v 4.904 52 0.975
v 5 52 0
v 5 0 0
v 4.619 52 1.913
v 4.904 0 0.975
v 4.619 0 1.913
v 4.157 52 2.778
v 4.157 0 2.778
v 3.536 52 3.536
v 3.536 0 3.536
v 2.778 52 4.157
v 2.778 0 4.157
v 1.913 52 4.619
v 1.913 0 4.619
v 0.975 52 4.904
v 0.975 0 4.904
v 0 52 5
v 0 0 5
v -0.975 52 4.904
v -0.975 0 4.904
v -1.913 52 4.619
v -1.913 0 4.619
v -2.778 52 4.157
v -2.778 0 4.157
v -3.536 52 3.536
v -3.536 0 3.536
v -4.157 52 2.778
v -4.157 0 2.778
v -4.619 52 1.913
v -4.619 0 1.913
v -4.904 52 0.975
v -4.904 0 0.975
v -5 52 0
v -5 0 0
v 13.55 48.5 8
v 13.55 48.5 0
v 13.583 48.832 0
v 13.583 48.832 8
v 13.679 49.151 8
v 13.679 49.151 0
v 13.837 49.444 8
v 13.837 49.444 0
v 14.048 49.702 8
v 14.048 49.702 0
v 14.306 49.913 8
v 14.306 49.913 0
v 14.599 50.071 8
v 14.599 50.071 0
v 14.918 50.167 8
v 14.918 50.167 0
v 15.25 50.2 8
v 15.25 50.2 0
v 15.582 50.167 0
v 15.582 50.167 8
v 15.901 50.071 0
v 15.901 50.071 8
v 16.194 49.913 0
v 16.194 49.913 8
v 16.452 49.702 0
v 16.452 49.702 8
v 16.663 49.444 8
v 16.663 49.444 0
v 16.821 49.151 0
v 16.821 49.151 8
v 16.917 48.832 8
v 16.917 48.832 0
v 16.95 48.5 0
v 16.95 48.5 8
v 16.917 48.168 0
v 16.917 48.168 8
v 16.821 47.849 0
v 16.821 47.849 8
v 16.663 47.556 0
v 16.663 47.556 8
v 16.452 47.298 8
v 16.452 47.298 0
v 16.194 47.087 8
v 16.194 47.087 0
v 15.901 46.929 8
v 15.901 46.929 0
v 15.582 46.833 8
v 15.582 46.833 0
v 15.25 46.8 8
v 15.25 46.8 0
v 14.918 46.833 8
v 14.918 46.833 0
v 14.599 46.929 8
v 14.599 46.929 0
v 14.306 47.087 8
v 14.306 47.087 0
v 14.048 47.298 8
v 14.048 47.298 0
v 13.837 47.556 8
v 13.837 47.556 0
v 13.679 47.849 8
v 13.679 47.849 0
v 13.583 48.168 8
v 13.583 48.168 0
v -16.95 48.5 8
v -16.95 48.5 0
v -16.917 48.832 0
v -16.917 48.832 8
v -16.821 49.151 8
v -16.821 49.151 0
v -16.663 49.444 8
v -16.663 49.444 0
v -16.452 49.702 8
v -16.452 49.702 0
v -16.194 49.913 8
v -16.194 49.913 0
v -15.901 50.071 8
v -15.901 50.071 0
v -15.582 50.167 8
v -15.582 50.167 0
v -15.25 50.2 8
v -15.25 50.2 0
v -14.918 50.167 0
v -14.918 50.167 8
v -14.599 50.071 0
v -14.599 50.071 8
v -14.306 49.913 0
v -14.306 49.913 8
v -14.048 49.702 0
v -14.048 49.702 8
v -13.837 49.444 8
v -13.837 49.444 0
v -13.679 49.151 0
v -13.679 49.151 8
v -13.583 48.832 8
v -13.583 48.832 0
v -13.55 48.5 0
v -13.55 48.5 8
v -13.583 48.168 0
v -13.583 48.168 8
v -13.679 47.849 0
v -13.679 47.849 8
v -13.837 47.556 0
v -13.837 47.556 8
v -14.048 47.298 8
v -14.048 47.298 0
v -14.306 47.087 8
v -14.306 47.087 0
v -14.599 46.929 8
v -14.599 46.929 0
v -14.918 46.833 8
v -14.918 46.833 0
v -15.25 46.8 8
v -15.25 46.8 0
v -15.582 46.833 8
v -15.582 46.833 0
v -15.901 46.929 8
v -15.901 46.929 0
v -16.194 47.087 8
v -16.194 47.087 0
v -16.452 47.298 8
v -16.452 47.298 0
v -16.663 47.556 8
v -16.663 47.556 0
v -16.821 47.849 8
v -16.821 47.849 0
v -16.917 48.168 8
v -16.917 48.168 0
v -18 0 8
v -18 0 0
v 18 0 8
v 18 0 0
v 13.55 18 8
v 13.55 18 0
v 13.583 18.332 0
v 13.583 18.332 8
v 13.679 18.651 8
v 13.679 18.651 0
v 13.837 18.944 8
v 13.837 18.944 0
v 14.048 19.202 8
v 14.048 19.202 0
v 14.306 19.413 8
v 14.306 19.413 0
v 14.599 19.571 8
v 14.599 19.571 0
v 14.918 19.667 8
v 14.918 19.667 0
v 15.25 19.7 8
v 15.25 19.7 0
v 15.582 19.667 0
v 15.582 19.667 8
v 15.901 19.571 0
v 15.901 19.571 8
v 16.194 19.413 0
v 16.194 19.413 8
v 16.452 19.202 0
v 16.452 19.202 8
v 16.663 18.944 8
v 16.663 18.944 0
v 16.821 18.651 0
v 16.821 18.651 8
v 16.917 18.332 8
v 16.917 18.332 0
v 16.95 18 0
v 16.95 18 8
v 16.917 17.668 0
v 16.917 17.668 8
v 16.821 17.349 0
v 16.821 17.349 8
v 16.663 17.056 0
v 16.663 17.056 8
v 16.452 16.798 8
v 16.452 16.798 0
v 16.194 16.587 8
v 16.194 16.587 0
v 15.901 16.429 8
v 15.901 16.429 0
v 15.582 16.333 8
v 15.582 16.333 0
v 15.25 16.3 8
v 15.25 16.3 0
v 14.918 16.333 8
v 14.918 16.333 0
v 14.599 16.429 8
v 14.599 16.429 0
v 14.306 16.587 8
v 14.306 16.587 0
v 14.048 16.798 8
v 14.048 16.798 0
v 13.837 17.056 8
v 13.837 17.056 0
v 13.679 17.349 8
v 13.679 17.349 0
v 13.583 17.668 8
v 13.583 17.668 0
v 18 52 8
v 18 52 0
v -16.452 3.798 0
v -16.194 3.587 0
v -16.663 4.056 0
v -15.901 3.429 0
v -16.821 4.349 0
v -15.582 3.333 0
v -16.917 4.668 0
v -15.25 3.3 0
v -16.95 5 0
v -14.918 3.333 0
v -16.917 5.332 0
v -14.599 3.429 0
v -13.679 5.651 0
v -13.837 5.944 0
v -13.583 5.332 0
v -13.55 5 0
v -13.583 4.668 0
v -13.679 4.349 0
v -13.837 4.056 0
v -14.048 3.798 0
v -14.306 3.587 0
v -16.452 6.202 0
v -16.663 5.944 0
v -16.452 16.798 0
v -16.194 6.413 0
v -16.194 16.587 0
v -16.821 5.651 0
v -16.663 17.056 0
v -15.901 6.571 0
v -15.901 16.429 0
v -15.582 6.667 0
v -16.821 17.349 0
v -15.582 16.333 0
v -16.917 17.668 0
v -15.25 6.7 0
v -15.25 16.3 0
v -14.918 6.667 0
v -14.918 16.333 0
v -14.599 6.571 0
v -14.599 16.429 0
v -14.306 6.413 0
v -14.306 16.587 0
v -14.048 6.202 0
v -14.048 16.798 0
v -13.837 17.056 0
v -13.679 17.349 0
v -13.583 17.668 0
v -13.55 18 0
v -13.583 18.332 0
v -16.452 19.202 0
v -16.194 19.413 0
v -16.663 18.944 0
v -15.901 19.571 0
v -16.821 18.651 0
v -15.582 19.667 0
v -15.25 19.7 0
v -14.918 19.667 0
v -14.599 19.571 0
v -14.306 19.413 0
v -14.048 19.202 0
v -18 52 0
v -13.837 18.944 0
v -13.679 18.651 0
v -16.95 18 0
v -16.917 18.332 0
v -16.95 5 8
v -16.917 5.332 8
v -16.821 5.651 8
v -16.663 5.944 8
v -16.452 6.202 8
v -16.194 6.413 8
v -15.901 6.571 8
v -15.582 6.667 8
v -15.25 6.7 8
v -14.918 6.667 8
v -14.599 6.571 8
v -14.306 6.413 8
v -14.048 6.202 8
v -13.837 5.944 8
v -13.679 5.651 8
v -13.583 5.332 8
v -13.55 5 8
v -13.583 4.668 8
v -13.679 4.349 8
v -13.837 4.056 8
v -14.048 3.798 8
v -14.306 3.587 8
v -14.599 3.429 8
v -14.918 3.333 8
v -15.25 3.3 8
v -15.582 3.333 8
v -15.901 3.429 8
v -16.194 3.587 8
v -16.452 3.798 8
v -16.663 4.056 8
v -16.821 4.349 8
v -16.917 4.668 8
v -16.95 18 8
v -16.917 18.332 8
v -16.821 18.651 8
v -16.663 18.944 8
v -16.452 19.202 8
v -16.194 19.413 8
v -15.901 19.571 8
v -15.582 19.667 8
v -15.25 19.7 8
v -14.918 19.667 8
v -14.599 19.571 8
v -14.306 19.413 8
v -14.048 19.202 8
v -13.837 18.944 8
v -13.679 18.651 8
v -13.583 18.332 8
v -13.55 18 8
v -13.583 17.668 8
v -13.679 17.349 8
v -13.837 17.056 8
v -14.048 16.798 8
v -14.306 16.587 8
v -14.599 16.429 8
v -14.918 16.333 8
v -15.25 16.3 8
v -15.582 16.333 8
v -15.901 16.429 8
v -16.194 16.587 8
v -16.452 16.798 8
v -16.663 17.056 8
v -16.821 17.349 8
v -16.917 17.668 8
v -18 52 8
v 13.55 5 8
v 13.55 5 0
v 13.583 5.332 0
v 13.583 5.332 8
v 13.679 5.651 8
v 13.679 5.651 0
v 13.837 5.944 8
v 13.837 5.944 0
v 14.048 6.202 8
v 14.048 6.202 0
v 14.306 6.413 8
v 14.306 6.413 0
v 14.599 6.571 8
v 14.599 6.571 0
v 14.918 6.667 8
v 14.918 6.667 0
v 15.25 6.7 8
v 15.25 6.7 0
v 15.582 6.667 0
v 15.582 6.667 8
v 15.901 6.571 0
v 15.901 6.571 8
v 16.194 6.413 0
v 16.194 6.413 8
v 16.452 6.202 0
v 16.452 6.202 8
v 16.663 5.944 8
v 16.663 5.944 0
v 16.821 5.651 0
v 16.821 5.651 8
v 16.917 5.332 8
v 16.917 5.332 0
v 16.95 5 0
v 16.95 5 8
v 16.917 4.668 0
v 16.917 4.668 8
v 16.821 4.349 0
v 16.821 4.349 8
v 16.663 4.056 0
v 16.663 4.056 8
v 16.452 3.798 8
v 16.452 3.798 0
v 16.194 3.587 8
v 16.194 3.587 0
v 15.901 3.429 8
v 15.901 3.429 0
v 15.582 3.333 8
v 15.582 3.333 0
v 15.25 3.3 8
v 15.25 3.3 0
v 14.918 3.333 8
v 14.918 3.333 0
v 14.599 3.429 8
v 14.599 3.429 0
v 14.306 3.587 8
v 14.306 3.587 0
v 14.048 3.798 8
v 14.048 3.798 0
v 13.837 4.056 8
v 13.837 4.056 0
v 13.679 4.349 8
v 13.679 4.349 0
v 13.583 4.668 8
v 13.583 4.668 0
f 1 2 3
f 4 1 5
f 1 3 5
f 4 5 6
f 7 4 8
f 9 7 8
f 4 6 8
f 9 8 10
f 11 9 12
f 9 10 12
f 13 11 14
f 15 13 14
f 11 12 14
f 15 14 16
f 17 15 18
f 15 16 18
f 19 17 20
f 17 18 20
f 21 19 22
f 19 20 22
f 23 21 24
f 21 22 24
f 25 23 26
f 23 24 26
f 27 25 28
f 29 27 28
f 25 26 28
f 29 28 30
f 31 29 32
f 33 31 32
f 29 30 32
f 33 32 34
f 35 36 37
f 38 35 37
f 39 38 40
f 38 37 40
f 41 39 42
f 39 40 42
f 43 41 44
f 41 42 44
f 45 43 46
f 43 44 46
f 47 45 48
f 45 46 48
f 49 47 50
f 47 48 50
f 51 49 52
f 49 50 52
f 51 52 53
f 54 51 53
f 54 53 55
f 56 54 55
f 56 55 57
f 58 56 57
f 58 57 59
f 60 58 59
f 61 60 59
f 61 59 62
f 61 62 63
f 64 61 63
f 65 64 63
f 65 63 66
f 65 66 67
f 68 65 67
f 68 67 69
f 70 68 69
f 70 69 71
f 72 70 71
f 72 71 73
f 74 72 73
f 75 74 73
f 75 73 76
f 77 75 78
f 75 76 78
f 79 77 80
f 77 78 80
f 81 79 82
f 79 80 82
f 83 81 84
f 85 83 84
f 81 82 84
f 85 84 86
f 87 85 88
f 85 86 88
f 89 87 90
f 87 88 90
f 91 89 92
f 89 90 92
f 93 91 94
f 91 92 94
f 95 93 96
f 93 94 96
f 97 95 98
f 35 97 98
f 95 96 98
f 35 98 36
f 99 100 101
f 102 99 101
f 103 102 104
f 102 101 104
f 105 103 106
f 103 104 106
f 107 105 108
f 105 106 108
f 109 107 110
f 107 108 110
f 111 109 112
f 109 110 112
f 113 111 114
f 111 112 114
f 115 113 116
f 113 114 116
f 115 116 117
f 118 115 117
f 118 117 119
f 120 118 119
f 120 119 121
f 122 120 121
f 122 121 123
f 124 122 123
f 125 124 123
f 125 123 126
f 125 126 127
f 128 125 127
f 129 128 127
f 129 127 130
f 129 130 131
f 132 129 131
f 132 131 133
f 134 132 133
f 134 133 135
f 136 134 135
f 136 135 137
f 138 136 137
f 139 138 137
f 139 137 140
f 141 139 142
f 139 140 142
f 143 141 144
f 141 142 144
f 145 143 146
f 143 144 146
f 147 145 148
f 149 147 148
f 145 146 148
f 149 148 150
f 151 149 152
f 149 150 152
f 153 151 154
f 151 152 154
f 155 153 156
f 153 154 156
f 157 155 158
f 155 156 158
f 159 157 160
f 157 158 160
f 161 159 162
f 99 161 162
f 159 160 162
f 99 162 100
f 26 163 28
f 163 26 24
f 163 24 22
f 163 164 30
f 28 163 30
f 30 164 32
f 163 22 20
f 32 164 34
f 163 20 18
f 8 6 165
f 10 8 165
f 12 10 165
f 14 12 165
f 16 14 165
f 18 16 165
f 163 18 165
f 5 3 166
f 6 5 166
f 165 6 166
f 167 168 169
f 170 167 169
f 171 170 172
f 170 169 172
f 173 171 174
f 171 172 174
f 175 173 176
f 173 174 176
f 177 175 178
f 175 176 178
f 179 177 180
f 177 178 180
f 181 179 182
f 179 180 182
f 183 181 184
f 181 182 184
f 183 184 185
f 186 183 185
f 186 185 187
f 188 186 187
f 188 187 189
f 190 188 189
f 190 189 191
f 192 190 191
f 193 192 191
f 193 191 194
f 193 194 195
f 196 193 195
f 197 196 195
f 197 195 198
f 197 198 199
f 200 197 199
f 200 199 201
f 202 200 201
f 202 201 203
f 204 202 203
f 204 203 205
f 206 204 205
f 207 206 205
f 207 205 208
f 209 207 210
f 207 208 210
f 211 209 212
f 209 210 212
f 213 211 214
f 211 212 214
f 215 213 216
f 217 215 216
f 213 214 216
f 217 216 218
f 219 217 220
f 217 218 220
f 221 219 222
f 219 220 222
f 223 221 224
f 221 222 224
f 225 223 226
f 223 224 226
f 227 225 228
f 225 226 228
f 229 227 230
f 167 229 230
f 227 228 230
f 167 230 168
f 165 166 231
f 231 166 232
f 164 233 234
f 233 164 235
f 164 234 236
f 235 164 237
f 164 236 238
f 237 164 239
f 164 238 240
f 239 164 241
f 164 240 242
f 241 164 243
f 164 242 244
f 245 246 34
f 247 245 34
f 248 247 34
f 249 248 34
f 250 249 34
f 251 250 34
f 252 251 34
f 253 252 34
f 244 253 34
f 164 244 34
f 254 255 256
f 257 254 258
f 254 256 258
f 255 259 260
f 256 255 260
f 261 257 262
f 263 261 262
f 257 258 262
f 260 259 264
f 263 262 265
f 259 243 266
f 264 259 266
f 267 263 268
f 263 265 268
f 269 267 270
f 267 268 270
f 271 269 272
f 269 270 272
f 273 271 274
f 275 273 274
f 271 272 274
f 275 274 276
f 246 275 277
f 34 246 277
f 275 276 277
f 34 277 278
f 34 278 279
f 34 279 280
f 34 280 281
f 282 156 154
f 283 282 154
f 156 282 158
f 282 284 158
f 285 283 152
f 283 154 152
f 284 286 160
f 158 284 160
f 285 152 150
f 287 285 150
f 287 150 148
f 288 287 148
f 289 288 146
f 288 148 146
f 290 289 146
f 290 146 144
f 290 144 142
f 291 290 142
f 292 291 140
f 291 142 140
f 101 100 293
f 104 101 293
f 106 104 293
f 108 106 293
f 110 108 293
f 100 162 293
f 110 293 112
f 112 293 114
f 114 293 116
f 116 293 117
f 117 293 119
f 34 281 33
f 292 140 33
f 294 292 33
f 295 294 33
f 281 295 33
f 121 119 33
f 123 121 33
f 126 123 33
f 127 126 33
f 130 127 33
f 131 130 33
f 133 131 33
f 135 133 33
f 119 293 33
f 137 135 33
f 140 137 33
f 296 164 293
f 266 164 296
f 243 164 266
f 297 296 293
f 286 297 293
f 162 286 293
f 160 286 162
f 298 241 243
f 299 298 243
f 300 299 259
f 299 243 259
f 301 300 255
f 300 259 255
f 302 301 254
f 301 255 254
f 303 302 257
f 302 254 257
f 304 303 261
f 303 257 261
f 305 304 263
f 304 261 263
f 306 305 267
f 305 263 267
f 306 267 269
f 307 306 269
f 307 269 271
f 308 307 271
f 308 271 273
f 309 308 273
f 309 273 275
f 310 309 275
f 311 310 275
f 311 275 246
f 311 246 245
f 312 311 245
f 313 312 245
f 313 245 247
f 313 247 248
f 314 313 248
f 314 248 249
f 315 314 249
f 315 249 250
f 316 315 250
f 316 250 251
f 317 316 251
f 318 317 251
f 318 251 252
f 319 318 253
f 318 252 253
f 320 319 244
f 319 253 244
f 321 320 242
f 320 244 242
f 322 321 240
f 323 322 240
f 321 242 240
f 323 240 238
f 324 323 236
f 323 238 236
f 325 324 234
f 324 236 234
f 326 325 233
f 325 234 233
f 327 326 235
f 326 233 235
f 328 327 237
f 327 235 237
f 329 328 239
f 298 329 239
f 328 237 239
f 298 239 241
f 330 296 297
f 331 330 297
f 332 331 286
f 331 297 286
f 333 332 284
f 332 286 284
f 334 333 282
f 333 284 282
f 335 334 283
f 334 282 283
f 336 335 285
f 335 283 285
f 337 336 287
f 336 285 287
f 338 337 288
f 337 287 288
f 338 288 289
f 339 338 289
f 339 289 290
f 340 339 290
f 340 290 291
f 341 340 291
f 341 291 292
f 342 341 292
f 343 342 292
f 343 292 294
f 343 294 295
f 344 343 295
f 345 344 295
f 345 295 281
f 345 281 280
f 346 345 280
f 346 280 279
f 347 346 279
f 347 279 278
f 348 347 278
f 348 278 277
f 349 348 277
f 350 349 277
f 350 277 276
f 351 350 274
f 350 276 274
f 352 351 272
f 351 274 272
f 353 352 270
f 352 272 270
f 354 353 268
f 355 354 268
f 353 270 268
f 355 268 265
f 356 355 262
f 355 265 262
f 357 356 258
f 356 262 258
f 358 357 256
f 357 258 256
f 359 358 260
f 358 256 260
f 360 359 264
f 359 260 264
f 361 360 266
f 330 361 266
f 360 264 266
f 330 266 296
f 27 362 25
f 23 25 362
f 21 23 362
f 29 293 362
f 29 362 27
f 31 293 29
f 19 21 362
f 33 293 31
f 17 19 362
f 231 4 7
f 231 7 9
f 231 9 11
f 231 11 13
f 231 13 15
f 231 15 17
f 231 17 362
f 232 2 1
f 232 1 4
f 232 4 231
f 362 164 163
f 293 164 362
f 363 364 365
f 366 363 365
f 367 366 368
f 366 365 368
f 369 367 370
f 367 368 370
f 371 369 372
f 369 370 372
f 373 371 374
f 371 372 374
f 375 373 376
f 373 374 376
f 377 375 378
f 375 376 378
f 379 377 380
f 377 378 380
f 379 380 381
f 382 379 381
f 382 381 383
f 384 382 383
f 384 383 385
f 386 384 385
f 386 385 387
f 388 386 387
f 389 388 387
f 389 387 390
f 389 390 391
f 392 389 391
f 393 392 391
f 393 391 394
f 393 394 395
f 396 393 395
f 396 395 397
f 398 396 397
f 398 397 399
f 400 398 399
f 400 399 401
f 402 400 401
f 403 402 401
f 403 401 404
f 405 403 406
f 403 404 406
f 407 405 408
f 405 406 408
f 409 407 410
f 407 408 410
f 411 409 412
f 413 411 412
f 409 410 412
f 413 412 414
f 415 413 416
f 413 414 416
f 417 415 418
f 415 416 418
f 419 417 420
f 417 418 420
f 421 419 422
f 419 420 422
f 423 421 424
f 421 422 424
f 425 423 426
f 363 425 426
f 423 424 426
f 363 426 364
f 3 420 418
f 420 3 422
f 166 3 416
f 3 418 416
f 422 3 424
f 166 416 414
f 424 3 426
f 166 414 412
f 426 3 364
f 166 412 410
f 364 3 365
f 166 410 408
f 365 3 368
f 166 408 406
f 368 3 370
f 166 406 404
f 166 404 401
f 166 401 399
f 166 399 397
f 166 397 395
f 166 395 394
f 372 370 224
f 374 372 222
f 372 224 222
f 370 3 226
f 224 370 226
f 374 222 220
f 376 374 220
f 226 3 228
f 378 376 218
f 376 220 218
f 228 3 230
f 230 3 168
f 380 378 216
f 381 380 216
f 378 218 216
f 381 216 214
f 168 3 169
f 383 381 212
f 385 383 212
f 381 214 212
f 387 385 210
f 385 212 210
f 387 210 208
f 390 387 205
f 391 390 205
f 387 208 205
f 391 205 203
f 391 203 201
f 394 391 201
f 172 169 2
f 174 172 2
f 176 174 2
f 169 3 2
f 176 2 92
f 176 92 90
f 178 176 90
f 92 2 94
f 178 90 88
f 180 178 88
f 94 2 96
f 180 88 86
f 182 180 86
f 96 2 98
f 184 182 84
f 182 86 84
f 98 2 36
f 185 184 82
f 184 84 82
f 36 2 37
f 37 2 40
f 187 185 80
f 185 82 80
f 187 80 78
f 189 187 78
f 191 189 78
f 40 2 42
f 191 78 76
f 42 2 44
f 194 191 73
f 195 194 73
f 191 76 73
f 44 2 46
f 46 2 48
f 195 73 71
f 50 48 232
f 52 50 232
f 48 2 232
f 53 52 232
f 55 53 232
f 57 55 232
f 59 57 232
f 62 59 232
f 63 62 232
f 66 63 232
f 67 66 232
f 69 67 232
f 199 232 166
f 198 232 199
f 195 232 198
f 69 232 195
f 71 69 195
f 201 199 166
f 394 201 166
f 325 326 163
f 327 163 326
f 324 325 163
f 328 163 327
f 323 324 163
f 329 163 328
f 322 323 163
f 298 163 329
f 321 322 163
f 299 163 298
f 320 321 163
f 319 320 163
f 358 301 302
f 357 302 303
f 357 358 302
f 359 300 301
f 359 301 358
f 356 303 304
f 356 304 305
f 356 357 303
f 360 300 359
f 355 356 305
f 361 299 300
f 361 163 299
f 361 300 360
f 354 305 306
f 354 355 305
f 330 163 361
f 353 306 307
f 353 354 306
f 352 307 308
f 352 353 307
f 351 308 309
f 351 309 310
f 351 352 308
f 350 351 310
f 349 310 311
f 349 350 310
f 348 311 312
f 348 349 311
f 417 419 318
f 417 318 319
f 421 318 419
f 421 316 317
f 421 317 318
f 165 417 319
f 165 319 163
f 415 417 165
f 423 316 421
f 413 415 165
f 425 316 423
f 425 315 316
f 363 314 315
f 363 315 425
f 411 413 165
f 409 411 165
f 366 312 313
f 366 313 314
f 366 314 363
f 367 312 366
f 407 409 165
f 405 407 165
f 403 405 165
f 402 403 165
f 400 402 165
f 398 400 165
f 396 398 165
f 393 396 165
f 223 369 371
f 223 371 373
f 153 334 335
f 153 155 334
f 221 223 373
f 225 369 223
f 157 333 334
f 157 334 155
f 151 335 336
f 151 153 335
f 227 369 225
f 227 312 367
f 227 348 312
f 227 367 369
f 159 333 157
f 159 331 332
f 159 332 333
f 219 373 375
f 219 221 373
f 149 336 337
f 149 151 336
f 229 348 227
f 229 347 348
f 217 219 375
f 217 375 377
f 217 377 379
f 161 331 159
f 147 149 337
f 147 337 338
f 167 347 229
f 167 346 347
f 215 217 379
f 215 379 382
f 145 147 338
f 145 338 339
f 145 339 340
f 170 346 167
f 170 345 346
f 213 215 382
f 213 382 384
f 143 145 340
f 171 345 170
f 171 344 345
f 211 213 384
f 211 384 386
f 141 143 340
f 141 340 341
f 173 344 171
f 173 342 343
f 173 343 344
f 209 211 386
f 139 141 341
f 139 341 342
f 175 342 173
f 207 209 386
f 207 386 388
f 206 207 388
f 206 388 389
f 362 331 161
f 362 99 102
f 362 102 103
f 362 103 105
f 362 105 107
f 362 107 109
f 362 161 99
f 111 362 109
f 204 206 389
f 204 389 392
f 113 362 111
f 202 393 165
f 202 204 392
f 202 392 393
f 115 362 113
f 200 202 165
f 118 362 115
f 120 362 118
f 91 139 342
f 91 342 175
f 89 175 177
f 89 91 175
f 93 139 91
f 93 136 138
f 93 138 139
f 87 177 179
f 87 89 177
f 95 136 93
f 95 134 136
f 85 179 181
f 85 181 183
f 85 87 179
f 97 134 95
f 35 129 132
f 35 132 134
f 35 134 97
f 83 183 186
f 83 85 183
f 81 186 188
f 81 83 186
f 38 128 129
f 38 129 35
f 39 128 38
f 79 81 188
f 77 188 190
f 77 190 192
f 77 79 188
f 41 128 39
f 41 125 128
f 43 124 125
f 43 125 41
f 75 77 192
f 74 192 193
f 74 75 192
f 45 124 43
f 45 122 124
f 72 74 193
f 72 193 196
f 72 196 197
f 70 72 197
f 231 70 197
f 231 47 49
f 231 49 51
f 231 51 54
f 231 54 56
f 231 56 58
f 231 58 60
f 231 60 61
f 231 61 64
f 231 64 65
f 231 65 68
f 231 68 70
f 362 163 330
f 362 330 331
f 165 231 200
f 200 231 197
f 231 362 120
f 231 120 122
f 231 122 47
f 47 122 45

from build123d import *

# Parameters (mm, degrees)
F0_W     = 36
F0_H     = 52
F1_DEPTH = 8
F3_D     = 3.4
F5_DEPTH = 52.001


with BuildPart() as f1:
    # F0 (on Top) → F1 (new body)
    with BuildSketch(Plane.XY):
        with Locations((0, 26)):
            Rectangle(F0_W, F0_H)
    extrude(amount=F1_DEPTH)

    # F3 (through all)
    with Locations(Plane.XY.offset(8)):
        with Locations((15.25, 48.5), (15.25, 5), (-15.25, 18), (-15.25, 48.5), (15.25, 18), (-15.25, 5)):
            Hole(F3_D / 2)

    # F4 (on face) → F5 (cut, through all)
    with BuildSketch(Plane.XZ):
        with BuildLine():
            ThreePointArc((-5, 0), (0, -5), (5, 0))
            Line((5, 0), (-5, 0))
        make_face()
        with BuildLine():
            Line((-5, 0), (5, 0))
            ThreePointArc((5, 0), (0, 5), (-5, 0))
        make_face()
    extrude(amount=-F5_DEPTH, mode=Mode.SUBTRACT)


solid = f1.part
